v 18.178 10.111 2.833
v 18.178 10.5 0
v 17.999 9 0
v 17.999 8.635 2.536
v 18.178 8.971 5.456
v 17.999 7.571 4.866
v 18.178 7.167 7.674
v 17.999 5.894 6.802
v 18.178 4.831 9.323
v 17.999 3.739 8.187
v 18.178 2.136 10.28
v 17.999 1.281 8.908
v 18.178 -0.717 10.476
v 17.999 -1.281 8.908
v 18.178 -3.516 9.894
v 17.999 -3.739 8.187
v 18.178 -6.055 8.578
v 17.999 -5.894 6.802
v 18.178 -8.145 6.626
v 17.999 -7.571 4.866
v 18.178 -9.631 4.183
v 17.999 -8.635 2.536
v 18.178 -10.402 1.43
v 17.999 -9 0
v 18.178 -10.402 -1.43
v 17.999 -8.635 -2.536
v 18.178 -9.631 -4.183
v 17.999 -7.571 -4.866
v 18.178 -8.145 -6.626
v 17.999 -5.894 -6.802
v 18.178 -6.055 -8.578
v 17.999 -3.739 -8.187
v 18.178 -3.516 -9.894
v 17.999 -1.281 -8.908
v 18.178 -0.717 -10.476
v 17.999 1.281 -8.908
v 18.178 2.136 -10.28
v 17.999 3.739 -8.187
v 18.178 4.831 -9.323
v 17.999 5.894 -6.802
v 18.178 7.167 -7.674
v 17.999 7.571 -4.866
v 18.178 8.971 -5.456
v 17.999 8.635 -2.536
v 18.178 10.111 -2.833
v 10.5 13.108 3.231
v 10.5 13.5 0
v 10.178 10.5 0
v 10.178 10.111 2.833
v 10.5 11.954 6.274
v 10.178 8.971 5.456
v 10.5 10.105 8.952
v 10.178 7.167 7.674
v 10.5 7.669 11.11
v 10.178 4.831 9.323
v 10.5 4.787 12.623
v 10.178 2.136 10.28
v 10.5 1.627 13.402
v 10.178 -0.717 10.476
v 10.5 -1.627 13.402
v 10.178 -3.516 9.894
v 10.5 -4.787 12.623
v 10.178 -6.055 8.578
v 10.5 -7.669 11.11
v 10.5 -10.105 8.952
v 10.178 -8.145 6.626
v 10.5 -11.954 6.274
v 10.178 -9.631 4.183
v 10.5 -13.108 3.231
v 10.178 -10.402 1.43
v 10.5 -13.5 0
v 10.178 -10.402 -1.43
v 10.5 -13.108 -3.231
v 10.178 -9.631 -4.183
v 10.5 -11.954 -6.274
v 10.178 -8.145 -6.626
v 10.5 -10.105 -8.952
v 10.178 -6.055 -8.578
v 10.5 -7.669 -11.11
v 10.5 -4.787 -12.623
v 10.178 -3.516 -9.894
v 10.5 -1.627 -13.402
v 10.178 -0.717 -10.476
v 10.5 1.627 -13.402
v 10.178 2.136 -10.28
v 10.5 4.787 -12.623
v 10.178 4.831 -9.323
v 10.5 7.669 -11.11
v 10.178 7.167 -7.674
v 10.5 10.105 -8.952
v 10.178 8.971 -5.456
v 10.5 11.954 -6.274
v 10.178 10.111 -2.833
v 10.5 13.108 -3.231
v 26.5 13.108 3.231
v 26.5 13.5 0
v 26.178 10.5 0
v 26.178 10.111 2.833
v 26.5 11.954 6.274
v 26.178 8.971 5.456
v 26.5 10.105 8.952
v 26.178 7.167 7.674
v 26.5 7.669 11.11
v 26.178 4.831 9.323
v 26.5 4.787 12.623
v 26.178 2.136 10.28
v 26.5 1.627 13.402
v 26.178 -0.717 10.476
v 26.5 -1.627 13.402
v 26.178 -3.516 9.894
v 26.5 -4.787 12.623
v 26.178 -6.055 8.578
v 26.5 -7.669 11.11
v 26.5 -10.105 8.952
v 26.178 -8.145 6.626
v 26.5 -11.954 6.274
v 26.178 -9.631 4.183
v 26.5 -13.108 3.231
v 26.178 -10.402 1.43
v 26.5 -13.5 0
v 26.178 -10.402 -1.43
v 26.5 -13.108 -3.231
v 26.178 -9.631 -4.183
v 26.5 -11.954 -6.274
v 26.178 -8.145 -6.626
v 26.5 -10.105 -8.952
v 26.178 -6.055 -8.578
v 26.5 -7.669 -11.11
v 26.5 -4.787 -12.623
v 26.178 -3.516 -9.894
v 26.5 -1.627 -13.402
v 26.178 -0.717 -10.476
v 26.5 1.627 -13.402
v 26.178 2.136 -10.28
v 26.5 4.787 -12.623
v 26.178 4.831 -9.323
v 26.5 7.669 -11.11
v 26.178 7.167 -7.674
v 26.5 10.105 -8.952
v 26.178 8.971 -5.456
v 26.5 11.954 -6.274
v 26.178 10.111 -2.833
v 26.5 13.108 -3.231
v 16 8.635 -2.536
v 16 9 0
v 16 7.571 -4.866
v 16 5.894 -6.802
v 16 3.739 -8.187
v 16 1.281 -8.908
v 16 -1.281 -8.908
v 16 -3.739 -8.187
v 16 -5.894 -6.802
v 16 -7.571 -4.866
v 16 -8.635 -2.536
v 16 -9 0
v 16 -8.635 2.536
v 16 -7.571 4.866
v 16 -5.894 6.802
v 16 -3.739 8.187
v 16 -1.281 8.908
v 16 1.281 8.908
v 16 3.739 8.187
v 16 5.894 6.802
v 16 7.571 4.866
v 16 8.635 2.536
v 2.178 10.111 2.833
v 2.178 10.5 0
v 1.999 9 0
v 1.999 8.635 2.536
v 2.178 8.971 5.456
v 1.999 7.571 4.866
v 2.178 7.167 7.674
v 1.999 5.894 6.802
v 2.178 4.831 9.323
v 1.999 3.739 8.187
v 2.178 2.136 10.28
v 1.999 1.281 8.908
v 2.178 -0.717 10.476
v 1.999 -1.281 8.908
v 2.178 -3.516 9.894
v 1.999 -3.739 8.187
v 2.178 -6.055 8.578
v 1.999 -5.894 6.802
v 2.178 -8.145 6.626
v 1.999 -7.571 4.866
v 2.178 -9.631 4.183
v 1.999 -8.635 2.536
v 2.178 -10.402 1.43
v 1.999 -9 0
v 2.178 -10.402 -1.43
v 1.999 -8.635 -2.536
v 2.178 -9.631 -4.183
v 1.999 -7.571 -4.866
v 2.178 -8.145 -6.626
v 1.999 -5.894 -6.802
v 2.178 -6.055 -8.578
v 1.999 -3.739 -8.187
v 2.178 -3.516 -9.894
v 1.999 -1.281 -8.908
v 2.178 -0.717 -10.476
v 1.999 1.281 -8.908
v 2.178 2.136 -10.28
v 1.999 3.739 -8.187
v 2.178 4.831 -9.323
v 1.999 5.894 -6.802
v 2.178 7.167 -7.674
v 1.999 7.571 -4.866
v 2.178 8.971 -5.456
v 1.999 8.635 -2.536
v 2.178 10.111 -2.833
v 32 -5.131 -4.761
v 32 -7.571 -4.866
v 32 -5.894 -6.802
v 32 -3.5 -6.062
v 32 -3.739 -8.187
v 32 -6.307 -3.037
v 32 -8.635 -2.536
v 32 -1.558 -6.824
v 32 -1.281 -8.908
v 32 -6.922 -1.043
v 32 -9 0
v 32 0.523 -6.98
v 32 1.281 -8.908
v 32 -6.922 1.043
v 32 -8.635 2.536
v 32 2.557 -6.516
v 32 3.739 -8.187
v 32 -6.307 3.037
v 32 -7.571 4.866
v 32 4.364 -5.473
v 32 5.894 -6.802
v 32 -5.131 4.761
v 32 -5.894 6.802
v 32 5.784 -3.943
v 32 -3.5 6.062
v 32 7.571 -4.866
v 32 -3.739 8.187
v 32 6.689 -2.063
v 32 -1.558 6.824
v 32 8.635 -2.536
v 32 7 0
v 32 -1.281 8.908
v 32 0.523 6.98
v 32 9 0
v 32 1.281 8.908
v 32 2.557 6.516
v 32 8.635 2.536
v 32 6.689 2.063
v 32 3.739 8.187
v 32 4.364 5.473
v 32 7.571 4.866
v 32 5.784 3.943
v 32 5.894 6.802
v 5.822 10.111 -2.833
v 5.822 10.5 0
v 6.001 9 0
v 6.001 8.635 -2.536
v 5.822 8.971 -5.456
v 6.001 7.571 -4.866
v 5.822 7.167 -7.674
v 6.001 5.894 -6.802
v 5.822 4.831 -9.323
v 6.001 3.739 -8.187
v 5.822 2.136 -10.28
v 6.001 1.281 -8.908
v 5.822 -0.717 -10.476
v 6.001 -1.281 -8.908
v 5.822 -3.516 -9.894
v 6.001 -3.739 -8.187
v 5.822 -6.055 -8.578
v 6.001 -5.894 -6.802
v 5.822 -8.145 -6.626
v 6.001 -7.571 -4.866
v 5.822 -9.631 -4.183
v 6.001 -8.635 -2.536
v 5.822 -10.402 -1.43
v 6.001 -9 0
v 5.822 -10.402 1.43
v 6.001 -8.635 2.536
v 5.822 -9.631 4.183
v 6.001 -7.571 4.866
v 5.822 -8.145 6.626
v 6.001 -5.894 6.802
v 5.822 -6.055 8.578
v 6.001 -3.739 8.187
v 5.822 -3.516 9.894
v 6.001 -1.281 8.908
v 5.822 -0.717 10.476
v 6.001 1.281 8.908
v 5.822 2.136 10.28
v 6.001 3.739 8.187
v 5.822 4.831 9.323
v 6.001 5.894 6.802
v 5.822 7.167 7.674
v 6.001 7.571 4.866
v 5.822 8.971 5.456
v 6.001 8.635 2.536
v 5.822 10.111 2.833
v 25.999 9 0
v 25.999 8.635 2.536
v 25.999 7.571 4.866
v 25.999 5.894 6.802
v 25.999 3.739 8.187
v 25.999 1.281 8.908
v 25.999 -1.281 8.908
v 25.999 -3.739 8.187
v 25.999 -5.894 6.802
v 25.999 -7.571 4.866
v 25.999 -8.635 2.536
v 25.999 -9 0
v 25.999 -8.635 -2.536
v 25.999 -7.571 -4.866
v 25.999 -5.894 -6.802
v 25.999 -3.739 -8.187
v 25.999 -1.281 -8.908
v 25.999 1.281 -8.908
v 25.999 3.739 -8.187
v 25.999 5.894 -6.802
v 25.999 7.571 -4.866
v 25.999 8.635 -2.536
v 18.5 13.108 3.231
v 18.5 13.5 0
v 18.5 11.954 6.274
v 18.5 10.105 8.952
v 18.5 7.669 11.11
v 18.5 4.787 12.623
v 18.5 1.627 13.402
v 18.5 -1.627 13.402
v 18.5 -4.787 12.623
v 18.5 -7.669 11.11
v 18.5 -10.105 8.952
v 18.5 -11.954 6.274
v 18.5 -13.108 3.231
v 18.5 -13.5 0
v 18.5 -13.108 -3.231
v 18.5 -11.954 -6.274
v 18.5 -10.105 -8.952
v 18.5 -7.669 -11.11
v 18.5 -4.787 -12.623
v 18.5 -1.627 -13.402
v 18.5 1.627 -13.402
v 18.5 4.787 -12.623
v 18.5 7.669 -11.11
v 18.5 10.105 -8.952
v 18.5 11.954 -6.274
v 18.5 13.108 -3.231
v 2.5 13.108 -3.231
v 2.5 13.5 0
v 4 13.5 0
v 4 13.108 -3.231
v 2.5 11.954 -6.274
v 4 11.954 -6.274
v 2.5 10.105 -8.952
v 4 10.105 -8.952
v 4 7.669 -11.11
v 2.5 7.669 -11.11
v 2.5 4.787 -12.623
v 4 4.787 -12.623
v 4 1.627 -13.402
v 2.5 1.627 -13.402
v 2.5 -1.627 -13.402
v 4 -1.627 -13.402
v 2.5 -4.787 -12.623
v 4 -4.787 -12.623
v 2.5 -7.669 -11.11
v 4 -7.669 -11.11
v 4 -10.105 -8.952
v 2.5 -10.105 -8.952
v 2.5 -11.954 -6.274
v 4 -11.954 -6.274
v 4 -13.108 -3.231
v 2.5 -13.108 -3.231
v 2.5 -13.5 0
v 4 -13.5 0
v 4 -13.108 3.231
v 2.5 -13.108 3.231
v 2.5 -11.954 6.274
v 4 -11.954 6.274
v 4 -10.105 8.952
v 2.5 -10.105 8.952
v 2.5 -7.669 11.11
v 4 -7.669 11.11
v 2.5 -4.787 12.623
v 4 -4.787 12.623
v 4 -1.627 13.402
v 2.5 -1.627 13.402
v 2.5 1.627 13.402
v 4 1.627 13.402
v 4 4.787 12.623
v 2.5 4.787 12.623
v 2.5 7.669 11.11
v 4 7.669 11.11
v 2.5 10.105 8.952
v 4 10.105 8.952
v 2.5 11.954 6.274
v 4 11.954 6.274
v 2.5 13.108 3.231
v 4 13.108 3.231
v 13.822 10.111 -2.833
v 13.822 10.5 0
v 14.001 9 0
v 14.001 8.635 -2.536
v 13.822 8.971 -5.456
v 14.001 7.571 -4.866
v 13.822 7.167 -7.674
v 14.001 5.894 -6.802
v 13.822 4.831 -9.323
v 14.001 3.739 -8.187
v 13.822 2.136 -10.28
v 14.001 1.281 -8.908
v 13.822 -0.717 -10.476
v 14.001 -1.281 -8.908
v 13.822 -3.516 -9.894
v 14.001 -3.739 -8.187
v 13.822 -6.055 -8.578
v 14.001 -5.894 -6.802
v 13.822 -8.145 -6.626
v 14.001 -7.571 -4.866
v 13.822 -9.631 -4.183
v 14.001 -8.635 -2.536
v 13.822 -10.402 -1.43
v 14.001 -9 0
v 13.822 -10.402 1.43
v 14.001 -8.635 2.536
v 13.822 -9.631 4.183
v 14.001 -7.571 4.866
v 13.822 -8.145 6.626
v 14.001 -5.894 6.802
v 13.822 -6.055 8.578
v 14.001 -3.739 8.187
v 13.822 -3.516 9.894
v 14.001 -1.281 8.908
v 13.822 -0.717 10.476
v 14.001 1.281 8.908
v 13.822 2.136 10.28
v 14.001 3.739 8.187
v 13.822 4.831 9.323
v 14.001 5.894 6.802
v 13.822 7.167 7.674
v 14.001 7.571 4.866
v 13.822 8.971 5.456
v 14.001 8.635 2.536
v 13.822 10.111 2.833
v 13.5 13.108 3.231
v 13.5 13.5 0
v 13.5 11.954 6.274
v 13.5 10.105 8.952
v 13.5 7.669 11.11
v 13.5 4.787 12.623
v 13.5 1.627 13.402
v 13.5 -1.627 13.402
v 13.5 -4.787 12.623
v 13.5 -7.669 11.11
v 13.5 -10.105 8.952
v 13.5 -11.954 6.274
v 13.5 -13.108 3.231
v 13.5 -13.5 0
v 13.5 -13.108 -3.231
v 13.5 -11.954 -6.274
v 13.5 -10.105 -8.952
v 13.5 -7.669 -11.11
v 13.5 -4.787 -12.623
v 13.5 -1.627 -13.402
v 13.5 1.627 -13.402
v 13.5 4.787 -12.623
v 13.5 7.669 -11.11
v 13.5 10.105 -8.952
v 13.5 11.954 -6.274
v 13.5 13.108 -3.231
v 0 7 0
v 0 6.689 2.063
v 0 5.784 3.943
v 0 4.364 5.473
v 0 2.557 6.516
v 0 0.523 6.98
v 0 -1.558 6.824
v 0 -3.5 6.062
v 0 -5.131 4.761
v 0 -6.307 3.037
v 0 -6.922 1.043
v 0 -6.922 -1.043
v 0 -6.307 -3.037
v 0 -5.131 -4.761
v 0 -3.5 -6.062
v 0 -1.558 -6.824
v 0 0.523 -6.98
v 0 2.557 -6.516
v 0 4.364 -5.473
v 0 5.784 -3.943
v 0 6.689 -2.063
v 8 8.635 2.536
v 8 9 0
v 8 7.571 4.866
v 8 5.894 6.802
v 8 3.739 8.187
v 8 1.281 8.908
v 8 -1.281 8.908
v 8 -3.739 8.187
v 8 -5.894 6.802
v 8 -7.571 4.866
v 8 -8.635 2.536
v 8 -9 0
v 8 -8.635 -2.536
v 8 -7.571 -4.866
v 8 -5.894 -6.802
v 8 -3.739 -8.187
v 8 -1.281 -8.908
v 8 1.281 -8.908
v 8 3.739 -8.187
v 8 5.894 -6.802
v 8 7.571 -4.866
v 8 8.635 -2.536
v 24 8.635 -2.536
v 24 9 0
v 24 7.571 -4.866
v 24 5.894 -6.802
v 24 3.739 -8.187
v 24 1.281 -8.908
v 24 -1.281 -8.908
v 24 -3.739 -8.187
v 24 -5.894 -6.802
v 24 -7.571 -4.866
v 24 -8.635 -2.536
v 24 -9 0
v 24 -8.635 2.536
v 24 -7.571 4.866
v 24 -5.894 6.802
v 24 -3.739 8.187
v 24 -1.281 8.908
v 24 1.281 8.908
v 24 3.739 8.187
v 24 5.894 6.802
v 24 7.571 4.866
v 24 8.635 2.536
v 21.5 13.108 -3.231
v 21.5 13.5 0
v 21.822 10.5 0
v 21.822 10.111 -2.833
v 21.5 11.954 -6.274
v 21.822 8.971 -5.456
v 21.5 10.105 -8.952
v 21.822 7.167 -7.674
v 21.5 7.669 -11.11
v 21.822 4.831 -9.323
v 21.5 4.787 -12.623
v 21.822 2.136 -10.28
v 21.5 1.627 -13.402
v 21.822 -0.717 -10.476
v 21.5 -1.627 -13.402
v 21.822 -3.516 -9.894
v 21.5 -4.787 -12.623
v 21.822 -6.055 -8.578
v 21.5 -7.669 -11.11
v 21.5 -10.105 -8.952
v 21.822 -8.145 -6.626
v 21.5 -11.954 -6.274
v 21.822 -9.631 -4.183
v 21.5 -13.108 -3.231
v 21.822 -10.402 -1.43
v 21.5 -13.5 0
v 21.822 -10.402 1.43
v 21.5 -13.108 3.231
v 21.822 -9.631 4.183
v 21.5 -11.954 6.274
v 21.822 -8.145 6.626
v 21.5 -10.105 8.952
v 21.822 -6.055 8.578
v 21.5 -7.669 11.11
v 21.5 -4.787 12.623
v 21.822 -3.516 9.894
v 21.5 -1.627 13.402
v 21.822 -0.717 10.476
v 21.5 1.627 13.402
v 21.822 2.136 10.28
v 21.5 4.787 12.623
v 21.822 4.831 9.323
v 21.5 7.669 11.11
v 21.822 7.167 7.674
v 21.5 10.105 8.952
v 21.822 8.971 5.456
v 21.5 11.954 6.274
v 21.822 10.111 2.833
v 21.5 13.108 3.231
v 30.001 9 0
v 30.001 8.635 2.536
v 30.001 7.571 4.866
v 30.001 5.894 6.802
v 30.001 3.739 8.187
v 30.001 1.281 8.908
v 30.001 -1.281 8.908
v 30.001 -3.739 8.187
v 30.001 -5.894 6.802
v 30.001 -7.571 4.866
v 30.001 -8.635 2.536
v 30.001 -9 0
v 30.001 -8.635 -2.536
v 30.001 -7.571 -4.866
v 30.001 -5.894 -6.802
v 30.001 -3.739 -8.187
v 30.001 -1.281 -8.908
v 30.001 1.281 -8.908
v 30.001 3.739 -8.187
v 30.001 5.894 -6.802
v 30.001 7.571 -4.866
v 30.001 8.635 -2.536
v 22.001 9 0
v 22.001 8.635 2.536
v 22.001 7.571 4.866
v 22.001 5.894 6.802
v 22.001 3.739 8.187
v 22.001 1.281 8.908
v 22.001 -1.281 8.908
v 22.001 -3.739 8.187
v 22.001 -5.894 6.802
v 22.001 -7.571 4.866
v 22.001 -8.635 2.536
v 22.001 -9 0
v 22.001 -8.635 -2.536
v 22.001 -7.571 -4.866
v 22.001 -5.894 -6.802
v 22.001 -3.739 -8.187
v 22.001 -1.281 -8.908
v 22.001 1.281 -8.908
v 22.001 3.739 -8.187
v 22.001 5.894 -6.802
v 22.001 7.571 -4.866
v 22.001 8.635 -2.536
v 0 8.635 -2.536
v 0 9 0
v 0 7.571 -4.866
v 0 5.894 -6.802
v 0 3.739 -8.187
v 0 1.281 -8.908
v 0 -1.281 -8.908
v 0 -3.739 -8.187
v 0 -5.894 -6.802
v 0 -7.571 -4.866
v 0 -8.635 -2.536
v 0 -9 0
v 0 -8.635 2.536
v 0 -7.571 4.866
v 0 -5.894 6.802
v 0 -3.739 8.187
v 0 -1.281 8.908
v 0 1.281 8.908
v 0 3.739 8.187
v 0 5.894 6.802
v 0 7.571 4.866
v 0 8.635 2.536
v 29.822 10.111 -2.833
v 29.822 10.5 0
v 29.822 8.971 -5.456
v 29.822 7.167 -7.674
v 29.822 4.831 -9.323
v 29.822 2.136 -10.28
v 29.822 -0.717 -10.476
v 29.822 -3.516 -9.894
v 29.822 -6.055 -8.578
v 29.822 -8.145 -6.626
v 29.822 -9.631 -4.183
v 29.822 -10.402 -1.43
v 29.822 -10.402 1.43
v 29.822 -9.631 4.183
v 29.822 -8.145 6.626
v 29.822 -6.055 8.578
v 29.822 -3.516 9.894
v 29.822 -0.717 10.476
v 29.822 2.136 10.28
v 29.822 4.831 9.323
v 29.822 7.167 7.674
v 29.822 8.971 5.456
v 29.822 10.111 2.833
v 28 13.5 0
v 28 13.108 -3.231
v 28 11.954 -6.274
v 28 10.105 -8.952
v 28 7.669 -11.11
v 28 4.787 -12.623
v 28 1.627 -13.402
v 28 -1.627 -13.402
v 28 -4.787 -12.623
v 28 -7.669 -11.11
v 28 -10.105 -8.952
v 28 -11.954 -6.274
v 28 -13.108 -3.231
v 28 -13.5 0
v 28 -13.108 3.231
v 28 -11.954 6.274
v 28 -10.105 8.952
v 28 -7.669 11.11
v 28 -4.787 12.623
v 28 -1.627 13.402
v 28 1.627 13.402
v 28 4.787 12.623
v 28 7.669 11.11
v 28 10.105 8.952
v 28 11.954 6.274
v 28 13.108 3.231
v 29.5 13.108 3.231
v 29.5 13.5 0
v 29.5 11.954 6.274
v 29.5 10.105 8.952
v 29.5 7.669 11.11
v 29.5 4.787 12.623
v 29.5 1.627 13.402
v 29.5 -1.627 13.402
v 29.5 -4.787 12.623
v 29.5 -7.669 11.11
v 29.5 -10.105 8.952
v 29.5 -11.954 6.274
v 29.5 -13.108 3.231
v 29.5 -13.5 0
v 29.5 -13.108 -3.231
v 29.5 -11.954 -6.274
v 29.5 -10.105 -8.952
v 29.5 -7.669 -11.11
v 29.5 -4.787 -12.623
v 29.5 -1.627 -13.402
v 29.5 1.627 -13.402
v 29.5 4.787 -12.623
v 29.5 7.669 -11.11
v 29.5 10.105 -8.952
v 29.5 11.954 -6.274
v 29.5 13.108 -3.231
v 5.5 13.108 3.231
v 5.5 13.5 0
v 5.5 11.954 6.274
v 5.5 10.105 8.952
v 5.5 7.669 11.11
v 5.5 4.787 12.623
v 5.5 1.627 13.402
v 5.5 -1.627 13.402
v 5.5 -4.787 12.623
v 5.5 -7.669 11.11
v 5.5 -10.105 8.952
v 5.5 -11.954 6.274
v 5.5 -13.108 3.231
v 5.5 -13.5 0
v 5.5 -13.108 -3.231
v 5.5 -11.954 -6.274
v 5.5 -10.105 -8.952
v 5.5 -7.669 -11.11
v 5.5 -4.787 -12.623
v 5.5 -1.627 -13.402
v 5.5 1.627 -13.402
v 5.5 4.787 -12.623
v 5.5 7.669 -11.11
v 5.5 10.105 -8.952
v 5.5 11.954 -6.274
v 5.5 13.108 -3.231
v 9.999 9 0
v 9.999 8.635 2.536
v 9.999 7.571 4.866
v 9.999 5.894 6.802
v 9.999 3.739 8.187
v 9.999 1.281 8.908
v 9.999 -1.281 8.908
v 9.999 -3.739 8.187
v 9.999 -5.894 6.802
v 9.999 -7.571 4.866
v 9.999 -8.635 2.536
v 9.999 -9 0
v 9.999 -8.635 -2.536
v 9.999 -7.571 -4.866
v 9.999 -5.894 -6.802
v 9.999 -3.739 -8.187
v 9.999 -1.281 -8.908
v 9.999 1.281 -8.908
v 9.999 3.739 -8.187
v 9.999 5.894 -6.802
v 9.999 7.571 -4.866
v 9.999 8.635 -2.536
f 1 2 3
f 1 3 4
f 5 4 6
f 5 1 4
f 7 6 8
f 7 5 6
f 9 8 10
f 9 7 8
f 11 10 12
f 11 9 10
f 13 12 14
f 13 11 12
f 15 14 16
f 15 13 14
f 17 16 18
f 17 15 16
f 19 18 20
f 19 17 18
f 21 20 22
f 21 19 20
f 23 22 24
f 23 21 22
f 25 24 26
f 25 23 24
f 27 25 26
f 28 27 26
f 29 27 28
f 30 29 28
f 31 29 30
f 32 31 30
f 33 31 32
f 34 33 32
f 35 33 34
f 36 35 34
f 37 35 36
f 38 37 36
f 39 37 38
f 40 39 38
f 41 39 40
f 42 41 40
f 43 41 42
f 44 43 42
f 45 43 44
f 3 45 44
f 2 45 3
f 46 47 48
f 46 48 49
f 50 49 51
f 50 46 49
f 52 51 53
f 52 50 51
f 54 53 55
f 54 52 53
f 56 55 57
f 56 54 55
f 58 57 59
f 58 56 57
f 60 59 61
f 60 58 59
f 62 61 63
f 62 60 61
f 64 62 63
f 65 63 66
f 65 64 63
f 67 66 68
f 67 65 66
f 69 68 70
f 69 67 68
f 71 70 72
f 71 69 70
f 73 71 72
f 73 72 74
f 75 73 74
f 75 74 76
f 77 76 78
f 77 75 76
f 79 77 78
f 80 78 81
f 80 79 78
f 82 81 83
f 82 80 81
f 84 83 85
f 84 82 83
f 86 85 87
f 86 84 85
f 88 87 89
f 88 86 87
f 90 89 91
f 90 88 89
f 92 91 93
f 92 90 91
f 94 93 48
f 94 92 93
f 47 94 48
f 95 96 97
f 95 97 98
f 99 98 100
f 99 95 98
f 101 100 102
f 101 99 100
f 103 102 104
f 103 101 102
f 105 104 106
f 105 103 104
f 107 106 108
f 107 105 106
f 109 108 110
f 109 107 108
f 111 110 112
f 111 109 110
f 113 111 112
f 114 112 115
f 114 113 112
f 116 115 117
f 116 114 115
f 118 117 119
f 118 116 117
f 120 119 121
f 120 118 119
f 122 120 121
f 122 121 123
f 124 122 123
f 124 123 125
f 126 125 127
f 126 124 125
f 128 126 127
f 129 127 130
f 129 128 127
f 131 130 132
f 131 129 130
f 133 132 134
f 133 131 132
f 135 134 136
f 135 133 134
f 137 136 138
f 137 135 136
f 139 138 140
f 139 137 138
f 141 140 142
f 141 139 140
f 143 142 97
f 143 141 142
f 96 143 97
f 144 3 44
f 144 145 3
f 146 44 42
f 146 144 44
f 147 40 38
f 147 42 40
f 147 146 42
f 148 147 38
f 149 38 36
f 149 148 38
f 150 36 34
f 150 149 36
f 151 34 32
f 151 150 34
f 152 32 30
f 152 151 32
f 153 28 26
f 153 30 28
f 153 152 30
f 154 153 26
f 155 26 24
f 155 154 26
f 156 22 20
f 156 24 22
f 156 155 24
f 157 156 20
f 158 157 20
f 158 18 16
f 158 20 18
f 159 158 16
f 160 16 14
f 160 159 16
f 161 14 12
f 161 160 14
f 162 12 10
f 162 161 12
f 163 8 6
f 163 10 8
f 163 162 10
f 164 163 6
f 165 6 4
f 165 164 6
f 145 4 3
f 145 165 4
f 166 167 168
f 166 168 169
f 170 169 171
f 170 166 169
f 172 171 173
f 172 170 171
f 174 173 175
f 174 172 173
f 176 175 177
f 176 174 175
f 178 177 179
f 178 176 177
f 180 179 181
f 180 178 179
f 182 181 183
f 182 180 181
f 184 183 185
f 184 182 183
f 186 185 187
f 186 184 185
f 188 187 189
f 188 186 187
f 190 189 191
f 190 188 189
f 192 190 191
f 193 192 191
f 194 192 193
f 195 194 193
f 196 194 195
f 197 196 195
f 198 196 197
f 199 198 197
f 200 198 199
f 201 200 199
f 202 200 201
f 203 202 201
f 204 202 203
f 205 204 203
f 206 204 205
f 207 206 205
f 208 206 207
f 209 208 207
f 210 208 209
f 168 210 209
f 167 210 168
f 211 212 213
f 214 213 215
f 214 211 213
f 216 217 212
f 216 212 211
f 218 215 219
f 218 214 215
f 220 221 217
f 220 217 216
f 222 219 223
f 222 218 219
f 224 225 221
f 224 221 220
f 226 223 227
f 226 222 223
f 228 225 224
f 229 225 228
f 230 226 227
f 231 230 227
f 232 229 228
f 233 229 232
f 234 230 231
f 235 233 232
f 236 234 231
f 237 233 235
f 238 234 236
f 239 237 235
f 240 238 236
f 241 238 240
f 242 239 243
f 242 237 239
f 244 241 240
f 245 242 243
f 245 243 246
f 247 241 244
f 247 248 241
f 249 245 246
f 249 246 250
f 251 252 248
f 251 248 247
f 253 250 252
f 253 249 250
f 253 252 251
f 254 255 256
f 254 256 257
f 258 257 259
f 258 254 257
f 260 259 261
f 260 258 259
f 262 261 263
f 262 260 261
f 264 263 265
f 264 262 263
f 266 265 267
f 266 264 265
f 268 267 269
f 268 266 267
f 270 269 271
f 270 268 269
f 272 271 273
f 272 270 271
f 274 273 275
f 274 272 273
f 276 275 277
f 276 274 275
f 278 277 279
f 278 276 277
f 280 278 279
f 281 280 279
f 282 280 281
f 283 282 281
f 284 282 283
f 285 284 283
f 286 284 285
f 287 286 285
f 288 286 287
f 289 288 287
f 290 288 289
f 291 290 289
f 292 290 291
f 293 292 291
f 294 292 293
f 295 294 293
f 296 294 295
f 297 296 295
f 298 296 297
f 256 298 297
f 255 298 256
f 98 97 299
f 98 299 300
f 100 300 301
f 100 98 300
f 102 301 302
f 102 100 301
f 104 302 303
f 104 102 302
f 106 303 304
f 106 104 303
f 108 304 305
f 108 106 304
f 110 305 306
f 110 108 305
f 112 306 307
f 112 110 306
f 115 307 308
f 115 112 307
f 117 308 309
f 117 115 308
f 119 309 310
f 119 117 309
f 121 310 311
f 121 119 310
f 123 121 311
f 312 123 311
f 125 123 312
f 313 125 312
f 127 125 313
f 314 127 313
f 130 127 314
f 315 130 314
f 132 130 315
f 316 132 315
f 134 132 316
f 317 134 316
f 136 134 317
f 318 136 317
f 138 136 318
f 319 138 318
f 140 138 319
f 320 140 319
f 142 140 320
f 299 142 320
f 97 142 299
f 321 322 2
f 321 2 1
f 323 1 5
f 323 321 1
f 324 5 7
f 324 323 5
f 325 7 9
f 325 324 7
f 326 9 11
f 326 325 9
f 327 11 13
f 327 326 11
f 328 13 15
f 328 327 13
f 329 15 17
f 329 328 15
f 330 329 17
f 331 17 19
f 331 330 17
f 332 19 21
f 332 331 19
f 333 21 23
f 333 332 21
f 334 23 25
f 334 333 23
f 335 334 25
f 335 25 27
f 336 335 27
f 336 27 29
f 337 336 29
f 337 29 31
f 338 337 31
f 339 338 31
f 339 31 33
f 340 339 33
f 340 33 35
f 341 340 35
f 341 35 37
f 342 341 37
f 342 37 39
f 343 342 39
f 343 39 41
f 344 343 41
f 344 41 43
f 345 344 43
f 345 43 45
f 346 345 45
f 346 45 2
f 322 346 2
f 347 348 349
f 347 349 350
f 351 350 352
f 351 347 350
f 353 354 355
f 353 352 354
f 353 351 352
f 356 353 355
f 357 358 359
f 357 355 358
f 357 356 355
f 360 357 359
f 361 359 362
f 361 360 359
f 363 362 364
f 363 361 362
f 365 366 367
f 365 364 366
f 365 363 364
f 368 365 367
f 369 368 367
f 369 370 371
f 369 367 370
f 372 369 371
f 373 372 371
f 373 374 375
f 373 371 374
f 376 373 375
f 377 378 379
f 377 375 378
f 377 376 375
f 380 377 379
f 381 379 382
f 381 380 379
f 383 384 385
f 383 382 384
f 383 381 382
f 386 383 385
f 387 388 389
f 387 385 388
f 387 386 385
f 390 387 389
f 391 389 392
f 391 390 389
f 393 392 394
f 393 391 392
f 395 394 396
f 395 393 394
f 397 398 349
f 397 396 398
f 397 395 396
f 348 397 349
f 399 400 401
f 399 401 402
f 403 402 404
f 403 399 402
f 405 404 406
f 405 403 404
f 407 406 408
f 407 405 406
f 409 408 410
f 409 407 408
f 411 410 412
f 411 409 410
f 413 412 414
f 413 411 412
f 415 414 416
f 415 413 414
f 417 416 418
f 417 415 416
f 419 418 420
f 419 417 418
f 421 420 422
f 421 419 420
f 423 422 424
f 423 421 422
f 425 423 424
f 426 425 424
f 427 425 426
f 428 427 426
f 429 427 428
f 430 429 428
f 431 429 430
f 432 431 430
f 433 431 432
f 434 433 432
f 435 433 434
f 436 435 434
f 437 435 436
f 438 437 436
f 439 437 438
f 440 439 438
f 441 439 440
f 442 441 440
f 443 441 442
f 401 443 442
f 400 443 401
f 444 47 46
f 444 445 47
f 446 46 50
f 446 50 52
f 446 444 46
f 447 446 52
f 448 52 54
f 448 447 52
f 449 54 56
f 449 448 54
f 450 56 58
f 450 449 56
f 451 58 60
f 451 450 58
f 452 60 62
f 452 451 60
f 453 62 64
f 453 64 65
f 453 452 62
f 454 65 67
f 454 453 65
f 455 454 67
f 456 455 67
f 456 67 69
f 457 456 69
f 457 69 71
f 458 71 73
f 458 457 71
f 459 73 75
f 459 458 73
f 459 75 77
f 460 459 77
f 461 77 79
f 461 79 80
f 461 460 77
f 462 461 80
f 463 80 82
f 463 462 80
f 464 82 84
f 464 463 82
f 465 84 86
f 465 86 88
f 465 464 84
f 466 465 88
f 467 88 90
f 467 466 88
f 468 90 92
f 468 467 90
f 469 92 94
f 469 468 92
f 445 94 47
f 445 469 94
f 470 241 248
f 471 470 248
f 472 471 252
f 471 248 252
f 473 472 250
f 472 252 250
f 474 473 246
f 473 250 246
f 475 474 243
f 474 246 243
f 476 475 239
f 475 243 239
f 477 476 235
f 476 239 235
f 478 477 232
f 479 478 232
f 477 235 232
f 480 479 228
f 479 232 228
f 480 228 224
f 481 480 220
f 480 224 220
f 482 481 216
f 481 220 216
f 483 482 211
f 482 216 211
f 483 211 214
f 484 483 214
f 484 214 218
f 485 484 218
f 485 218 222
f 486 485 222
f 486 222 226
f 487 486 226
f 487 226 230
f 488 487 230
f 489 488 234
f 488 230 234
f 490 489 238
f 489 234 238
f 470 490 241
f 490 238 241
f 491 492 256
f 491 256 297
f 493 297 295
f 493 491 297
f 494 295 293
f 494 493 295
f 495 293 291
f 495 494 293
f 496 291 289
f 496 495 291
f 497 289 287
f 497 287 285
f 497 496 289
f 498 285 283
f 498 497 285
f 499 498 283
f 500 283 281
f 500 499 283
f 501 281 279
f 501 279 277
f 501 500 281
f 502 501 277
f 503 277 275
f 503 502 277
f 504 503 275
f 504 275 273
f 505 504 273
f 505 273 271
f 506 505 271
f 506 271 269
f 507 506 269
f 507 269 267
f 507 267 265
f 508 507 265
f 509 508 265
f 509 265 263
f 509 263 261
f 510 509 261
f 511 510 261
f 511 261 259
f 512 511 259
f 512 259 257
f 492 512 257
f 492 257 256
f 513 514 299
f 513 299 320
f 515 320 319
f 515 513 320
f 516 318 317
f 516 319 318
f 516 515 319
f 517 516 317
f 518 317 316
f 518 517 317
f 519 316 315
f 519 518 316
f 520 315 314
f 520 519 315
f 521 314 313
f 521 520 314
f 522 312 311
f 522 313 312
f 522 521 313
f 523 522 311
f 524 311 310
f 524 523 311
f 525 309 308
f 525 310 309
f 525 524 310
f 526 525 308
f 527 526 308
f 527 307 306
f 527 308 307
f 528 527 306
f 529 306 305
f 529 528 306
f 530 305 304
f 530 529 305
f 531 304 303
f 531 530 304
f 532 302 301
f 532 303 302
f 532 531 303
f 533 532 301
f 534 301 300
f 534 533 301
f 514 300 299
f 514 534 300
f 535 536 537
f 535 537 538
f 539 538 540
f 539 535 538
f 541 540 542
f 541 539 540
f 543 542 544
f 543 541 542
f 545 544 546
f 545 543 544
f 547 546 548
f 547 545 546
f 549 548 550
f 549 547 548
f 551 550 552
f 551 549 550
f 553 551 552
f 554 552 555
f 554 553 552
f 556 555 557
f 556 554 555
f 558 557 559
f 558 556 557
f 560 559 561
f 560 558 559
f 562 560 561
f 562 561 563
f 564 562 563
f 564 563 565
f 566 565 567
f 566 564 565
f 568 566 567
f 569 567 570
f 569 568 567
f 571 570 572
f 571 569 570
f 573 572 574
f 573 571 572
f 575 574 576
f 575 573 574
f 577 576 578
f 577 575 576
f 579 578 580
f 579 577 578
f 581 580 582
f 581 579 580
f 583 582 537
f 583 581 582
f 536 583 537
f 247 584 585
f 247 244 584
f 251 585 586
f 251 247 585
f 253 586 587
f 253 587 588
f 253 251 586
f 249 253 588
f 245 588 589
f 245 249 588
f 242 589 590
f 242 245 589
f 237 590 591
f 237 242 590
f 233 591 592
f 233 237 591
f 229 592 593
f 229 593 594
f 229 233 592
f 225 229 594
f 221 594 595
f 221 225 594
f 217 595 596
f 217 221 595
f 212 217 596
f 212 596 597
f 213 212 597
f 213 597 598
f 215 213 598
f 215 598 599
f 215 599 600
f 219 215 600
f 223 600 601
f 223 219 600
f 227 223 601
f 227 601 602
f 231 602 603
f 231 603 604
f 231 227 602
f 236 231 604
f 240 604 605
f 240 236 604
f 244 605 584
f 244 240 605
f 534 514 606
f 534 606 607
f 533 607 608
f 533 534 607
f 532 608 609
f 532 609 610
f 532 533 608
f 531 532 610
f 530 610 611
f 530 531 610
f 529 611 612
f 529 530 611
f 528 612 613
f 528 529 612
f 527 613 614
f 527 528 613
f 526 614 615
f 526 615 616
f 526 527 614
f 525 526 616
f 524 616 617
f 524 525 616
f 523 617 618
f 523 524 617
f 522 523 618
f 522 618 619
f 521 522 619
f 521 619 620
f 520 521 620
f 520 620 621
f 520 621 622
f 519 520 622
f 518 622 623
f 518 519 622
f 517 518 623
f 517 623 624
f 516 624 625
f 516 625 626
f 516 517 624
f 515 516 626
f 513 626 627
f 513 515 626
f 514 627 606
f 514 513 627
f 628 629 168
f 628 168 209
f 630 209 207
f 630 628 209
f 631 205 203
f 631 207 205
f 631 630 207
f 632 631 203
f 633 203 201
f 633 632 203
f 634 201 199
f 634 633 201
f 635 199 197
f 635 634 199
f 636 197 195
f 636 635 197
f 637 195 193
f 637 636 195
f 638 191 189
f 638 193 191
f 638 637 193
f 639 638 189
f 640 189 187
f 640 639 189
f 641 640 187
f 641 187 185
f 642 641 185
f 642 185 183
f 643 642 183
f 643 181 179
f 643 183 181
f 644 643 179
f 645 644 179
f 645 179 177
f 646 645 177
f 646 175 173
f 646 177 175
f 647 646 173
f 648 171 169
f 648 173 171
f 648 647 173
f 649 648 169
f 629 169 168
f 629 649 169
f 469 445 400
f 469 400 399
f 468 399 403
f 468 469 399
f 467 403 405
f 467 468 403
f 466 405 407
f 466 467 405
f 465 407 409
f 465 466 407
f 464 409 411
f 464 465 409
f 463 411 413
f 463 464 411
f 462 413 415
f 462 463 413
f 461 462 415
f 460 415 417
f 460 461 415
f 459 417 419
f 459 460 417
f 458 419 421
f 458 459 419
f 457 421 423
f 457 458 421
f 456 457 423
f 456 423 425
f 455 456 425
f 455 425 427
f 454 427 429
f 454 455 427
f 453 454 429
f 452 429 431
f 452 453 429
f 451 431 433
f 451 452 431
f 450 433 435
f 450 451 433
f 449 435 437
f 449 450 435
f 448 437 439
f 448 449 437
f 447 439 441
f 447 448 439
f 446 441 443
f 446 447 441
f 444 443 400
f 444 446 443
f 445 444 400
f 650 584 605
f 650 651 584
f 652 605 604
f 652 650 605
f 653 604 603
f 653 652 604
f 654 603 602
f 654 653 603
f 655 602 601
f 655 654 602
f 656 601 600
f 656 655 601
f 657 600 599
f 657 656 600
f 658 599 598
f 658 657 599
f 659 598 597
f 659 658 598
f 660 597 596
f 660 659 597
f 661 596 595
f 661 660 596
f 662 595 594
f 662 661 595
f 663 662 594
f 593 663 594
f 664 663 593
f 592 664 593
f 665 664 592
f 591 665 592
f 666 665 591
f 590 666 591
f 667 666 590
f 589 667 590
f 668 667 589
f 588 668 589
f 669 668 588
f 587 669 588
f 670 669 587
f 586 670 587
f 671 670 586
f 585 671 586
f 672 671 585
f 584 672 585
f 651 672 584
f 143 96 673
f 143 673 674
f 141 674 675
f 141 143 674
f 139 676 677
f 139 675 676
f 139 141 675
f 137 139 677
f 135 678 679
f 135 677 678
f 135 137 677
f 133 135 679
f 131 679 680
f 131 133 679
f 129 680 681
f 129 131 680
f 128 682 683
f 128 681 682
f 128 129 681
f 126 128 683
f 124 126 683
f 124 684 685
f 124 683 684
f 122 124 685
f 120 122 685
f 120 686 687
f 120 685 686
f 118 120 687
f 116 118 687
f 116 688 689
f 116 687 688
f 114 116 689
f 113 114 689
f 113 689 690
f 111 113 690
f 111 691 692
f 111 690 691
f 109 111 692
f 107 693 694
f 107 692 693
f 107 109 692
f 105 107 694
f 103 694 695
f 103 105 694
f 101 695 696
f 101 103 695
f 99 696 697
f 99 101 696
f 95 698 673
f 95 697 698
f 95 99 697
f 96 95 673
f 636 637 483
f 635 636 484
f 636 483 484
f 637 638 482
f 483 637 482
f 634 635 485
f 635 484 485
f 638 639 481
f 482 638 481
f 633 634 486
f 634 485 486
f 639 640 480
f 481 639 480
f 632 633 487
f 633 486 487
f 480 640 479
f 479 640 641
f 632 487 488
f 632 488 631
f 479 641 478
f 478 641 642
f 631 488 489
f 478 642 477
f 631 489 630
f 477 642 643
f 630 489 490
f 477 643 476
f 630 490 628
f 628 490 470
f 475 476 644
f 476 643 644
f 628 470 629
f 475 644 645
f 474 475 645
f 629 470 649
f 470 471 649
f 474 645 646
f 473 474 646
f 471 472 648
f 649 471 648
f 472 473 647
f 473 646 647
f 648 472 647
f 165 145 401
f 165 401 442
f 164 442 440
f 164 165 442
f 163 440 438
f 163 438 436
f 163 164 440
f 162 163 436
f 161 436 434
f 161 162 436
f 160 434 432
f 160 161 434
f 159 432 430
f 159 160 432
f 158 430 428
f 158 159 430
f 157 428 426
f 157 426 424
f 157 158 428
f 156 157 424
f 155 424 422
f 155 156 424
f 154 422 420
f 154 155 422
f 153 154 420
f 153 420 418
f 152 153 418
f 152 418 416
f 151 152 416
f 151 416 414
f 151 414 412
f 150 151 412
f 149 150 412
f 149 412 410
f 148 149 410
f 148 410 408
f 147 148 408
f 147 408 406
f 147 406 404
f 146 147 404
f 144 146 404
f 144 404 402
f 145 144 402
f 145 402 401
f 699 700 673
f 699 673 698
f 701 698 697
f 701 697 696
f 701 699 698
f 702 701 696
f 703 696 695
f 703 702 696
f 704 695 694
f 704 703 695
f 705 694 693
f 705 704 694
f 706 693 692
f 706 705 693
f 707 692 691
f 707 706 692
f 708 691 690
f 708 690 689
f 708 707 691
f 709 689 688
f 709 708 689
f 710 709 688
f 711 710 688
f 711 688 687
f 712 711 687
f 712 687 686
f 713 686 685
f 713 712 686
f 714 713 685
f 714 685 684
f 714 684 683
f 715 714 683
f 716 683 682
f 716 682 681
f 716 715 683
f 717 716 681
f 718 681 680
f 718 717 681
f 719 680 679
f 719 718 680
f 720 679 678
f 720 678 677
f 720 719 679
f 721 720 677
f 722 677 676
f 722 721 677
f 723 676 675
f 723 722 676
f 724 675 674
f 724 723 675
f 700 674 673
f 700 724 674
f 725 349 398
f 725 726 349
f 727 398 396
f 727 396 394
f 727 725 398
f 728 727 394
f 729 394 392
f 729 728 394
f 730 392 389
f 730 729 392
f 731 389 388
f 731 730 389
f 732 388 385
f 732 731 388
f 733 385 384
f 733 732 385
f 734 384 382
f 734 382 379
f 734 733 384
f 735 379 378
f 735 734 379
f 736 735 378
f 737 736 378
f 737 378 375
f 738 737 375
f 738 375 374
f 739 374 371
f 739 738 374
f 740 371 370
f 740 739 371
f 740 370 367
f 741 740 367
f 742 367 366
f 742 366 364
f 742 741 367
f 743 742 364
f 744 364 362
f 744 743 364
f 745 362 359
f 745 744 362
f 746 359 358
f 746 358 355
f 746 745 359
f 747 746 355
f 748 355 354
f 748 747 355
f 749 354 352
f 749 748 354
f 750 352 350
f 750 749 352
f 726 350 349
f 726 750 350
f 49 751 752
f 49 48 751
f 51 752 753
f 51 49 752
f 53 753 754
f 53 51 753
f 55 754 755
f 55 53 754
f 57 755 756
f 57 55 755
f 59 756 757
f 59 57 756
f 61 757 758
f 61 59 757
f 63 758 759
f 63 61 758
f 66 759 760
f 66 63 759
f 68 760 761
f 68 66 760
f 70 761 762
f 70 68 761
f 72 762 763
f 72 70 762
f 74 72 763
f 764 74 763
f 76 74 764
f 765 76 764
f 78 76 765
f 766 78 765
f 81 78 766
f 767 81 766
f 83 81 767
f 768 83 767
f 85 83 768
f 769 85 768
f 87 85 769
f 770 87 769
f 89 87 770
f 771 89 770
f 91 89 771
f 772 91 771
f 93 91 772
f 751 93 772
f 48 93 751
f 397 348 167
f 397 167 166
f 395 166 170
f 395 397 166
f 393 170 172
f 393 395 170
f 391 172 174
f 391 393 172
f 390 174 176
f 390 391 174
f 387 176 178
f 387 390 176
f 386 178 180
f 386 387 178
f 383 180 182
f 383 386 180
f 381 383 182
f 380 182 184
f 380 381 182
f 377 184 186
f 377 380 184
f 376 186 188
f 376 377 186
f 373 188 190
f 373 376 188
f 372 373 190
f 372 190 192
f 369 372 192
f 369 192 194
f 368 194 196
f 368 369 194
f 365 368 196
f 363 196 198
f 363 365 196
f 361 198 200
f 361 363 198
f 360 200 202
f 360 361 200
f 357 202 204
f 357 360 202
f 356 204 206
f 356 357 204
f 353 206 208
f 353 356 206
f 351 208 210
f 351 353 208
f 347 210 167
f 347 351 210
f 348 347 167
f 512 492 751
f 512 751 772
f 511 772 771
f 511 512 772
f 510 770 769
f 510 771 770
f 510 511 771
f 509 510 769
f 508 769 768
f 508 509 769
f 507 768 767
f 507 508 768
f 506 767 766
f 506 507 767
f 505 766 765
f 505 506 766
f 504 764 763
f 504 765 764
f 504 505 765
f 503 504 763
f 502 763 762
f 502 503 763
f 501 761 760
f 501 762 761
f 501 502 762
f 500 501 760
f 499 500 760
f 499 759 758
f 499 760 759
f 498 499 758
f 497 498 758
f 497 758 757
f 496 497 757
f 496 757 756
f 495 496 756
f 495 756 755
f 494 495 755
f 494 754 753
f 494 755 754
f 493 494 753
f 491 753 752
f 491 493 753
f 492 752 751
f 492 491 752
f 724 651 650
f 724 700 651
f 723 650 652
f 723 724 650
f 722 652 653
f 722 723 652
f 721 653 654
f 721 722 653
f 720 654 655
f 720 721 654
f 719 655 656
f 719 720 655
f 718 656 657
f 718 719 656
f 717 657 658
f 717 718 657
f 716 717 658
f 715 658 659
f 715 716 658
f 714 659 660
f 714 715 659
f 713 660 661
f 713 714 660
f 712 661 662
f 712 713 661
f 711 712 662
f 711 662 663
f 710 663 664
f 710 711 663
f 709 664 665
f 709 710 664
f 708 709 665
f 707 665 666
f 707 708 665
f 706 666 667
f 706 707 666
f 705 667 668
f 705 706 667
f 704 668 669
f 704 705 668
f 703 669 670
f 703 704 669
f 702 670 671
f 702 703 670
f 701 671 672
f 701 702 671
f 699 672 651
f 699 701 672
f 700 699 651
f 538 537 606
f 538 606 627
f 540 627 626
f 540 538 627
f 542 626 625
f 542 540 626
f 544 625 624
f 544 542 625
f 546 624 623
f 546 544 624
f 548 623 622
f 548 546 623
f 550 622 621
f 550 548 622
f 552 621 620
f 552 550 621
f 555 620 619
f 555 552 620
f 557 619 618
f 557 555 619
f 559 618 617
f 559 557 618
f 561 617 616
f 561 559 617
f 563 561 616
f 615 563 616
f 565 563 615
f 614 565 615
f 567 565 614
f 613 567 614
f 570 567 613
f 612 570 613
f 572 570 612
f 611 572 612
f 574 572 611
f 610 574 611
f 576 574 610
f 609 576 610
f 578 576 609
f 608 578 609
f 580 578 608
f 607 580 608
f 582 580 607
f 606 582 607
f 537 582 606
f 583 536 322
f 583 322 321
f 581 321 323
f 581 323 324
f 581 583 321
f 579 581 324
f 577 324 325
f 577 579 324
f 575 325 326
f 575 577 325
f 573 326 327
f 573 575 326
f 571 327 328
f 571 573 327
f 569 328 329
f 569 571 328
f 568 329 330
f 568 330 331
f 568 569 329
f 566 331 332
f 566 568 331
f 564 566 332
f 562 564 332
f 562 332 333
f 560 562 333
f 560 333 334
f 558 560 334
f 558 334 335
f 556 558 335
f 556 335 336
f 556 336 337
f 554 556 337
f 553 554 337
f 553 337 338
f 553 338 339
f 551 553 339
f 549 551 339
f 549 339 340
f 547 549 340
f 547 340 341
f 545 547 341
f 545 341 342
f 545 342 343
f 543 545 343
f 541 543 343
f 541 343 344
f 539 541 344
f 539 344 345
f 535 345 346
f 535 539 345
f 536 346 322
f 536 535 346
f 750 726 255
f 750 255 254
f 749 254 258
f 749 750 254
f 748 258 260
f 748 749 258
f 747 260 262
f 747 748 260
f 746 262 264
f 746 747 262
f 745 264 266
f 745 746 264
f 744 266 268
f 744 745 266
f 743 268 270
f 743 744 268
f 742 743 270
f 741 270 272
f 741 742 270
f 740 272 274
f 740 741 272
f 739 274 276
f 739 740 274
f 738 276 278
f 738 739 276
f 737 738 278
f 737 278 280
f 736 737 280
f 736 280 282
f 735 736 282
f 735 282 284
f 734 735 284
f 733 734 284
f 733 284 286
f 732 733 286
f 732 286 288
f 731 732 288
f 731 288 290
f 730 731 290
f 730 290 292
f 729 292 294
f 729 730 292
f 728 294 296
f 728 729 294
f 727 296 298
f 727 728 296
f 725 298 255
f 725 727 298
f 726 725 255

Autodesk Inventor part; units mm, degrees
ref_plane "YZ Plane" through (0, 0, 0) normal (1, 0, 0) x (0, 1, 0)
ref_plane "XZ Plane" through (0, 0, 0) normal (0, 1, 0) x (-1, 0, 0)
ref_plane "XY Plane" through (0, 0, 0) normal (0, 0, 1) x (1, 0, 0)
sketch "Эскиз1" plane through (0, 0, 0) normal (0, 0, 1) x (1, 0, 0)
  line L0 (0, 0) -> (32, 0)
  line L1 (0, 7) -> (32, 7)
  line L2 (4, 13.5) -> (2.5, 13.5)
  line L3 (2.5, 13.5) -> (2.1775, 10.5)
  line L4 (2.1775, 10.5) -> (1.9988, 9)
  line L5 (1.9988, 9) -> (0, 9)
  line L6 (0, 9) -> (0, 7)
  line L7 (4, 13.5) -> (4, 8.1664)
  line L8 (4, 13.5) -> (5.5, 13.5)
  line L9 (5.5, 13.5) -> (5.8225, 10.5)
  line L10 (5.8225, 10.5) -> (6.0012, 9)
  line L11 (6.0012, 9) -> (8, 9)
  line L12 (13.5, 13.5) -> (13.8225, 10.5)
  line L13 (13.8225, 10.5) -> (14.0012, 9)
  line L14 (14.0012, 9) -> (16, 9)
  line L15 (10.1775, 10.5) -> (9.9988, 9)
  line L16 (10.5, 13.5) -> (10.1775, 10.5)
  line L17 (9.9988, 9) -> (8, 9)
  line L18 (16, 9) -> (16, 13.7658)
  line L19 (28, 13.5) -> (29.5, 13.5)
  line L20 (29.5, 13.5) -> (29.8225, 10.5)
  line L21 (29.8225, 10.5) -> (30.0012, 9)
  line L22 (26.1775, 10.5) -> (25.9988, 9)
  line L23 (26.5, 13.5) -> (26.1775, 10.5)
  line L24 (28, 13.5) -> (26.5, 13.5)
  line L25 (25.9988, 9) -> (24, 9)
  line L26 (17.9988, 9) -> (16, 9)
  line L27 (18.1775, 10.5) -> (17.9988, 9)
  line L28 (18.5, 13.5) -> (18.1775, 10.5)
  line L29 (21.5, 13.5) -> (21.8225, 10.5)
  line L30 (21.8225, 10.5) -> (22.0012, 9)
  line L31 (22.0012, 9) -> (24, 9)
  line L32 (30.0012, 9) -> (32, 9)
  line L33 (32, 9) -> (32, 7)
  line L34 (10.5, 13.5) -> (13.5, 13.5)
  line L35 (18.5, 13.5) -> (21.5, 13.5)
  point P0 (1.5, 8.1664)
  dimension "d14" = 32
  dimension "d15" = 14
  dimension "d16" = 27
  dimension "d20" = 4
  dimension "d22" = 3
  dimension "d33" = 1.5
  dimension "d35" = 2
  dimension "d37" = 32
revolve "Вращение1" add sketch "Эскиз1" angle 360 about axis through (0, 0, 0) along (1, 0, 0)
properties part number "Демфер пальца" material "Резина"
